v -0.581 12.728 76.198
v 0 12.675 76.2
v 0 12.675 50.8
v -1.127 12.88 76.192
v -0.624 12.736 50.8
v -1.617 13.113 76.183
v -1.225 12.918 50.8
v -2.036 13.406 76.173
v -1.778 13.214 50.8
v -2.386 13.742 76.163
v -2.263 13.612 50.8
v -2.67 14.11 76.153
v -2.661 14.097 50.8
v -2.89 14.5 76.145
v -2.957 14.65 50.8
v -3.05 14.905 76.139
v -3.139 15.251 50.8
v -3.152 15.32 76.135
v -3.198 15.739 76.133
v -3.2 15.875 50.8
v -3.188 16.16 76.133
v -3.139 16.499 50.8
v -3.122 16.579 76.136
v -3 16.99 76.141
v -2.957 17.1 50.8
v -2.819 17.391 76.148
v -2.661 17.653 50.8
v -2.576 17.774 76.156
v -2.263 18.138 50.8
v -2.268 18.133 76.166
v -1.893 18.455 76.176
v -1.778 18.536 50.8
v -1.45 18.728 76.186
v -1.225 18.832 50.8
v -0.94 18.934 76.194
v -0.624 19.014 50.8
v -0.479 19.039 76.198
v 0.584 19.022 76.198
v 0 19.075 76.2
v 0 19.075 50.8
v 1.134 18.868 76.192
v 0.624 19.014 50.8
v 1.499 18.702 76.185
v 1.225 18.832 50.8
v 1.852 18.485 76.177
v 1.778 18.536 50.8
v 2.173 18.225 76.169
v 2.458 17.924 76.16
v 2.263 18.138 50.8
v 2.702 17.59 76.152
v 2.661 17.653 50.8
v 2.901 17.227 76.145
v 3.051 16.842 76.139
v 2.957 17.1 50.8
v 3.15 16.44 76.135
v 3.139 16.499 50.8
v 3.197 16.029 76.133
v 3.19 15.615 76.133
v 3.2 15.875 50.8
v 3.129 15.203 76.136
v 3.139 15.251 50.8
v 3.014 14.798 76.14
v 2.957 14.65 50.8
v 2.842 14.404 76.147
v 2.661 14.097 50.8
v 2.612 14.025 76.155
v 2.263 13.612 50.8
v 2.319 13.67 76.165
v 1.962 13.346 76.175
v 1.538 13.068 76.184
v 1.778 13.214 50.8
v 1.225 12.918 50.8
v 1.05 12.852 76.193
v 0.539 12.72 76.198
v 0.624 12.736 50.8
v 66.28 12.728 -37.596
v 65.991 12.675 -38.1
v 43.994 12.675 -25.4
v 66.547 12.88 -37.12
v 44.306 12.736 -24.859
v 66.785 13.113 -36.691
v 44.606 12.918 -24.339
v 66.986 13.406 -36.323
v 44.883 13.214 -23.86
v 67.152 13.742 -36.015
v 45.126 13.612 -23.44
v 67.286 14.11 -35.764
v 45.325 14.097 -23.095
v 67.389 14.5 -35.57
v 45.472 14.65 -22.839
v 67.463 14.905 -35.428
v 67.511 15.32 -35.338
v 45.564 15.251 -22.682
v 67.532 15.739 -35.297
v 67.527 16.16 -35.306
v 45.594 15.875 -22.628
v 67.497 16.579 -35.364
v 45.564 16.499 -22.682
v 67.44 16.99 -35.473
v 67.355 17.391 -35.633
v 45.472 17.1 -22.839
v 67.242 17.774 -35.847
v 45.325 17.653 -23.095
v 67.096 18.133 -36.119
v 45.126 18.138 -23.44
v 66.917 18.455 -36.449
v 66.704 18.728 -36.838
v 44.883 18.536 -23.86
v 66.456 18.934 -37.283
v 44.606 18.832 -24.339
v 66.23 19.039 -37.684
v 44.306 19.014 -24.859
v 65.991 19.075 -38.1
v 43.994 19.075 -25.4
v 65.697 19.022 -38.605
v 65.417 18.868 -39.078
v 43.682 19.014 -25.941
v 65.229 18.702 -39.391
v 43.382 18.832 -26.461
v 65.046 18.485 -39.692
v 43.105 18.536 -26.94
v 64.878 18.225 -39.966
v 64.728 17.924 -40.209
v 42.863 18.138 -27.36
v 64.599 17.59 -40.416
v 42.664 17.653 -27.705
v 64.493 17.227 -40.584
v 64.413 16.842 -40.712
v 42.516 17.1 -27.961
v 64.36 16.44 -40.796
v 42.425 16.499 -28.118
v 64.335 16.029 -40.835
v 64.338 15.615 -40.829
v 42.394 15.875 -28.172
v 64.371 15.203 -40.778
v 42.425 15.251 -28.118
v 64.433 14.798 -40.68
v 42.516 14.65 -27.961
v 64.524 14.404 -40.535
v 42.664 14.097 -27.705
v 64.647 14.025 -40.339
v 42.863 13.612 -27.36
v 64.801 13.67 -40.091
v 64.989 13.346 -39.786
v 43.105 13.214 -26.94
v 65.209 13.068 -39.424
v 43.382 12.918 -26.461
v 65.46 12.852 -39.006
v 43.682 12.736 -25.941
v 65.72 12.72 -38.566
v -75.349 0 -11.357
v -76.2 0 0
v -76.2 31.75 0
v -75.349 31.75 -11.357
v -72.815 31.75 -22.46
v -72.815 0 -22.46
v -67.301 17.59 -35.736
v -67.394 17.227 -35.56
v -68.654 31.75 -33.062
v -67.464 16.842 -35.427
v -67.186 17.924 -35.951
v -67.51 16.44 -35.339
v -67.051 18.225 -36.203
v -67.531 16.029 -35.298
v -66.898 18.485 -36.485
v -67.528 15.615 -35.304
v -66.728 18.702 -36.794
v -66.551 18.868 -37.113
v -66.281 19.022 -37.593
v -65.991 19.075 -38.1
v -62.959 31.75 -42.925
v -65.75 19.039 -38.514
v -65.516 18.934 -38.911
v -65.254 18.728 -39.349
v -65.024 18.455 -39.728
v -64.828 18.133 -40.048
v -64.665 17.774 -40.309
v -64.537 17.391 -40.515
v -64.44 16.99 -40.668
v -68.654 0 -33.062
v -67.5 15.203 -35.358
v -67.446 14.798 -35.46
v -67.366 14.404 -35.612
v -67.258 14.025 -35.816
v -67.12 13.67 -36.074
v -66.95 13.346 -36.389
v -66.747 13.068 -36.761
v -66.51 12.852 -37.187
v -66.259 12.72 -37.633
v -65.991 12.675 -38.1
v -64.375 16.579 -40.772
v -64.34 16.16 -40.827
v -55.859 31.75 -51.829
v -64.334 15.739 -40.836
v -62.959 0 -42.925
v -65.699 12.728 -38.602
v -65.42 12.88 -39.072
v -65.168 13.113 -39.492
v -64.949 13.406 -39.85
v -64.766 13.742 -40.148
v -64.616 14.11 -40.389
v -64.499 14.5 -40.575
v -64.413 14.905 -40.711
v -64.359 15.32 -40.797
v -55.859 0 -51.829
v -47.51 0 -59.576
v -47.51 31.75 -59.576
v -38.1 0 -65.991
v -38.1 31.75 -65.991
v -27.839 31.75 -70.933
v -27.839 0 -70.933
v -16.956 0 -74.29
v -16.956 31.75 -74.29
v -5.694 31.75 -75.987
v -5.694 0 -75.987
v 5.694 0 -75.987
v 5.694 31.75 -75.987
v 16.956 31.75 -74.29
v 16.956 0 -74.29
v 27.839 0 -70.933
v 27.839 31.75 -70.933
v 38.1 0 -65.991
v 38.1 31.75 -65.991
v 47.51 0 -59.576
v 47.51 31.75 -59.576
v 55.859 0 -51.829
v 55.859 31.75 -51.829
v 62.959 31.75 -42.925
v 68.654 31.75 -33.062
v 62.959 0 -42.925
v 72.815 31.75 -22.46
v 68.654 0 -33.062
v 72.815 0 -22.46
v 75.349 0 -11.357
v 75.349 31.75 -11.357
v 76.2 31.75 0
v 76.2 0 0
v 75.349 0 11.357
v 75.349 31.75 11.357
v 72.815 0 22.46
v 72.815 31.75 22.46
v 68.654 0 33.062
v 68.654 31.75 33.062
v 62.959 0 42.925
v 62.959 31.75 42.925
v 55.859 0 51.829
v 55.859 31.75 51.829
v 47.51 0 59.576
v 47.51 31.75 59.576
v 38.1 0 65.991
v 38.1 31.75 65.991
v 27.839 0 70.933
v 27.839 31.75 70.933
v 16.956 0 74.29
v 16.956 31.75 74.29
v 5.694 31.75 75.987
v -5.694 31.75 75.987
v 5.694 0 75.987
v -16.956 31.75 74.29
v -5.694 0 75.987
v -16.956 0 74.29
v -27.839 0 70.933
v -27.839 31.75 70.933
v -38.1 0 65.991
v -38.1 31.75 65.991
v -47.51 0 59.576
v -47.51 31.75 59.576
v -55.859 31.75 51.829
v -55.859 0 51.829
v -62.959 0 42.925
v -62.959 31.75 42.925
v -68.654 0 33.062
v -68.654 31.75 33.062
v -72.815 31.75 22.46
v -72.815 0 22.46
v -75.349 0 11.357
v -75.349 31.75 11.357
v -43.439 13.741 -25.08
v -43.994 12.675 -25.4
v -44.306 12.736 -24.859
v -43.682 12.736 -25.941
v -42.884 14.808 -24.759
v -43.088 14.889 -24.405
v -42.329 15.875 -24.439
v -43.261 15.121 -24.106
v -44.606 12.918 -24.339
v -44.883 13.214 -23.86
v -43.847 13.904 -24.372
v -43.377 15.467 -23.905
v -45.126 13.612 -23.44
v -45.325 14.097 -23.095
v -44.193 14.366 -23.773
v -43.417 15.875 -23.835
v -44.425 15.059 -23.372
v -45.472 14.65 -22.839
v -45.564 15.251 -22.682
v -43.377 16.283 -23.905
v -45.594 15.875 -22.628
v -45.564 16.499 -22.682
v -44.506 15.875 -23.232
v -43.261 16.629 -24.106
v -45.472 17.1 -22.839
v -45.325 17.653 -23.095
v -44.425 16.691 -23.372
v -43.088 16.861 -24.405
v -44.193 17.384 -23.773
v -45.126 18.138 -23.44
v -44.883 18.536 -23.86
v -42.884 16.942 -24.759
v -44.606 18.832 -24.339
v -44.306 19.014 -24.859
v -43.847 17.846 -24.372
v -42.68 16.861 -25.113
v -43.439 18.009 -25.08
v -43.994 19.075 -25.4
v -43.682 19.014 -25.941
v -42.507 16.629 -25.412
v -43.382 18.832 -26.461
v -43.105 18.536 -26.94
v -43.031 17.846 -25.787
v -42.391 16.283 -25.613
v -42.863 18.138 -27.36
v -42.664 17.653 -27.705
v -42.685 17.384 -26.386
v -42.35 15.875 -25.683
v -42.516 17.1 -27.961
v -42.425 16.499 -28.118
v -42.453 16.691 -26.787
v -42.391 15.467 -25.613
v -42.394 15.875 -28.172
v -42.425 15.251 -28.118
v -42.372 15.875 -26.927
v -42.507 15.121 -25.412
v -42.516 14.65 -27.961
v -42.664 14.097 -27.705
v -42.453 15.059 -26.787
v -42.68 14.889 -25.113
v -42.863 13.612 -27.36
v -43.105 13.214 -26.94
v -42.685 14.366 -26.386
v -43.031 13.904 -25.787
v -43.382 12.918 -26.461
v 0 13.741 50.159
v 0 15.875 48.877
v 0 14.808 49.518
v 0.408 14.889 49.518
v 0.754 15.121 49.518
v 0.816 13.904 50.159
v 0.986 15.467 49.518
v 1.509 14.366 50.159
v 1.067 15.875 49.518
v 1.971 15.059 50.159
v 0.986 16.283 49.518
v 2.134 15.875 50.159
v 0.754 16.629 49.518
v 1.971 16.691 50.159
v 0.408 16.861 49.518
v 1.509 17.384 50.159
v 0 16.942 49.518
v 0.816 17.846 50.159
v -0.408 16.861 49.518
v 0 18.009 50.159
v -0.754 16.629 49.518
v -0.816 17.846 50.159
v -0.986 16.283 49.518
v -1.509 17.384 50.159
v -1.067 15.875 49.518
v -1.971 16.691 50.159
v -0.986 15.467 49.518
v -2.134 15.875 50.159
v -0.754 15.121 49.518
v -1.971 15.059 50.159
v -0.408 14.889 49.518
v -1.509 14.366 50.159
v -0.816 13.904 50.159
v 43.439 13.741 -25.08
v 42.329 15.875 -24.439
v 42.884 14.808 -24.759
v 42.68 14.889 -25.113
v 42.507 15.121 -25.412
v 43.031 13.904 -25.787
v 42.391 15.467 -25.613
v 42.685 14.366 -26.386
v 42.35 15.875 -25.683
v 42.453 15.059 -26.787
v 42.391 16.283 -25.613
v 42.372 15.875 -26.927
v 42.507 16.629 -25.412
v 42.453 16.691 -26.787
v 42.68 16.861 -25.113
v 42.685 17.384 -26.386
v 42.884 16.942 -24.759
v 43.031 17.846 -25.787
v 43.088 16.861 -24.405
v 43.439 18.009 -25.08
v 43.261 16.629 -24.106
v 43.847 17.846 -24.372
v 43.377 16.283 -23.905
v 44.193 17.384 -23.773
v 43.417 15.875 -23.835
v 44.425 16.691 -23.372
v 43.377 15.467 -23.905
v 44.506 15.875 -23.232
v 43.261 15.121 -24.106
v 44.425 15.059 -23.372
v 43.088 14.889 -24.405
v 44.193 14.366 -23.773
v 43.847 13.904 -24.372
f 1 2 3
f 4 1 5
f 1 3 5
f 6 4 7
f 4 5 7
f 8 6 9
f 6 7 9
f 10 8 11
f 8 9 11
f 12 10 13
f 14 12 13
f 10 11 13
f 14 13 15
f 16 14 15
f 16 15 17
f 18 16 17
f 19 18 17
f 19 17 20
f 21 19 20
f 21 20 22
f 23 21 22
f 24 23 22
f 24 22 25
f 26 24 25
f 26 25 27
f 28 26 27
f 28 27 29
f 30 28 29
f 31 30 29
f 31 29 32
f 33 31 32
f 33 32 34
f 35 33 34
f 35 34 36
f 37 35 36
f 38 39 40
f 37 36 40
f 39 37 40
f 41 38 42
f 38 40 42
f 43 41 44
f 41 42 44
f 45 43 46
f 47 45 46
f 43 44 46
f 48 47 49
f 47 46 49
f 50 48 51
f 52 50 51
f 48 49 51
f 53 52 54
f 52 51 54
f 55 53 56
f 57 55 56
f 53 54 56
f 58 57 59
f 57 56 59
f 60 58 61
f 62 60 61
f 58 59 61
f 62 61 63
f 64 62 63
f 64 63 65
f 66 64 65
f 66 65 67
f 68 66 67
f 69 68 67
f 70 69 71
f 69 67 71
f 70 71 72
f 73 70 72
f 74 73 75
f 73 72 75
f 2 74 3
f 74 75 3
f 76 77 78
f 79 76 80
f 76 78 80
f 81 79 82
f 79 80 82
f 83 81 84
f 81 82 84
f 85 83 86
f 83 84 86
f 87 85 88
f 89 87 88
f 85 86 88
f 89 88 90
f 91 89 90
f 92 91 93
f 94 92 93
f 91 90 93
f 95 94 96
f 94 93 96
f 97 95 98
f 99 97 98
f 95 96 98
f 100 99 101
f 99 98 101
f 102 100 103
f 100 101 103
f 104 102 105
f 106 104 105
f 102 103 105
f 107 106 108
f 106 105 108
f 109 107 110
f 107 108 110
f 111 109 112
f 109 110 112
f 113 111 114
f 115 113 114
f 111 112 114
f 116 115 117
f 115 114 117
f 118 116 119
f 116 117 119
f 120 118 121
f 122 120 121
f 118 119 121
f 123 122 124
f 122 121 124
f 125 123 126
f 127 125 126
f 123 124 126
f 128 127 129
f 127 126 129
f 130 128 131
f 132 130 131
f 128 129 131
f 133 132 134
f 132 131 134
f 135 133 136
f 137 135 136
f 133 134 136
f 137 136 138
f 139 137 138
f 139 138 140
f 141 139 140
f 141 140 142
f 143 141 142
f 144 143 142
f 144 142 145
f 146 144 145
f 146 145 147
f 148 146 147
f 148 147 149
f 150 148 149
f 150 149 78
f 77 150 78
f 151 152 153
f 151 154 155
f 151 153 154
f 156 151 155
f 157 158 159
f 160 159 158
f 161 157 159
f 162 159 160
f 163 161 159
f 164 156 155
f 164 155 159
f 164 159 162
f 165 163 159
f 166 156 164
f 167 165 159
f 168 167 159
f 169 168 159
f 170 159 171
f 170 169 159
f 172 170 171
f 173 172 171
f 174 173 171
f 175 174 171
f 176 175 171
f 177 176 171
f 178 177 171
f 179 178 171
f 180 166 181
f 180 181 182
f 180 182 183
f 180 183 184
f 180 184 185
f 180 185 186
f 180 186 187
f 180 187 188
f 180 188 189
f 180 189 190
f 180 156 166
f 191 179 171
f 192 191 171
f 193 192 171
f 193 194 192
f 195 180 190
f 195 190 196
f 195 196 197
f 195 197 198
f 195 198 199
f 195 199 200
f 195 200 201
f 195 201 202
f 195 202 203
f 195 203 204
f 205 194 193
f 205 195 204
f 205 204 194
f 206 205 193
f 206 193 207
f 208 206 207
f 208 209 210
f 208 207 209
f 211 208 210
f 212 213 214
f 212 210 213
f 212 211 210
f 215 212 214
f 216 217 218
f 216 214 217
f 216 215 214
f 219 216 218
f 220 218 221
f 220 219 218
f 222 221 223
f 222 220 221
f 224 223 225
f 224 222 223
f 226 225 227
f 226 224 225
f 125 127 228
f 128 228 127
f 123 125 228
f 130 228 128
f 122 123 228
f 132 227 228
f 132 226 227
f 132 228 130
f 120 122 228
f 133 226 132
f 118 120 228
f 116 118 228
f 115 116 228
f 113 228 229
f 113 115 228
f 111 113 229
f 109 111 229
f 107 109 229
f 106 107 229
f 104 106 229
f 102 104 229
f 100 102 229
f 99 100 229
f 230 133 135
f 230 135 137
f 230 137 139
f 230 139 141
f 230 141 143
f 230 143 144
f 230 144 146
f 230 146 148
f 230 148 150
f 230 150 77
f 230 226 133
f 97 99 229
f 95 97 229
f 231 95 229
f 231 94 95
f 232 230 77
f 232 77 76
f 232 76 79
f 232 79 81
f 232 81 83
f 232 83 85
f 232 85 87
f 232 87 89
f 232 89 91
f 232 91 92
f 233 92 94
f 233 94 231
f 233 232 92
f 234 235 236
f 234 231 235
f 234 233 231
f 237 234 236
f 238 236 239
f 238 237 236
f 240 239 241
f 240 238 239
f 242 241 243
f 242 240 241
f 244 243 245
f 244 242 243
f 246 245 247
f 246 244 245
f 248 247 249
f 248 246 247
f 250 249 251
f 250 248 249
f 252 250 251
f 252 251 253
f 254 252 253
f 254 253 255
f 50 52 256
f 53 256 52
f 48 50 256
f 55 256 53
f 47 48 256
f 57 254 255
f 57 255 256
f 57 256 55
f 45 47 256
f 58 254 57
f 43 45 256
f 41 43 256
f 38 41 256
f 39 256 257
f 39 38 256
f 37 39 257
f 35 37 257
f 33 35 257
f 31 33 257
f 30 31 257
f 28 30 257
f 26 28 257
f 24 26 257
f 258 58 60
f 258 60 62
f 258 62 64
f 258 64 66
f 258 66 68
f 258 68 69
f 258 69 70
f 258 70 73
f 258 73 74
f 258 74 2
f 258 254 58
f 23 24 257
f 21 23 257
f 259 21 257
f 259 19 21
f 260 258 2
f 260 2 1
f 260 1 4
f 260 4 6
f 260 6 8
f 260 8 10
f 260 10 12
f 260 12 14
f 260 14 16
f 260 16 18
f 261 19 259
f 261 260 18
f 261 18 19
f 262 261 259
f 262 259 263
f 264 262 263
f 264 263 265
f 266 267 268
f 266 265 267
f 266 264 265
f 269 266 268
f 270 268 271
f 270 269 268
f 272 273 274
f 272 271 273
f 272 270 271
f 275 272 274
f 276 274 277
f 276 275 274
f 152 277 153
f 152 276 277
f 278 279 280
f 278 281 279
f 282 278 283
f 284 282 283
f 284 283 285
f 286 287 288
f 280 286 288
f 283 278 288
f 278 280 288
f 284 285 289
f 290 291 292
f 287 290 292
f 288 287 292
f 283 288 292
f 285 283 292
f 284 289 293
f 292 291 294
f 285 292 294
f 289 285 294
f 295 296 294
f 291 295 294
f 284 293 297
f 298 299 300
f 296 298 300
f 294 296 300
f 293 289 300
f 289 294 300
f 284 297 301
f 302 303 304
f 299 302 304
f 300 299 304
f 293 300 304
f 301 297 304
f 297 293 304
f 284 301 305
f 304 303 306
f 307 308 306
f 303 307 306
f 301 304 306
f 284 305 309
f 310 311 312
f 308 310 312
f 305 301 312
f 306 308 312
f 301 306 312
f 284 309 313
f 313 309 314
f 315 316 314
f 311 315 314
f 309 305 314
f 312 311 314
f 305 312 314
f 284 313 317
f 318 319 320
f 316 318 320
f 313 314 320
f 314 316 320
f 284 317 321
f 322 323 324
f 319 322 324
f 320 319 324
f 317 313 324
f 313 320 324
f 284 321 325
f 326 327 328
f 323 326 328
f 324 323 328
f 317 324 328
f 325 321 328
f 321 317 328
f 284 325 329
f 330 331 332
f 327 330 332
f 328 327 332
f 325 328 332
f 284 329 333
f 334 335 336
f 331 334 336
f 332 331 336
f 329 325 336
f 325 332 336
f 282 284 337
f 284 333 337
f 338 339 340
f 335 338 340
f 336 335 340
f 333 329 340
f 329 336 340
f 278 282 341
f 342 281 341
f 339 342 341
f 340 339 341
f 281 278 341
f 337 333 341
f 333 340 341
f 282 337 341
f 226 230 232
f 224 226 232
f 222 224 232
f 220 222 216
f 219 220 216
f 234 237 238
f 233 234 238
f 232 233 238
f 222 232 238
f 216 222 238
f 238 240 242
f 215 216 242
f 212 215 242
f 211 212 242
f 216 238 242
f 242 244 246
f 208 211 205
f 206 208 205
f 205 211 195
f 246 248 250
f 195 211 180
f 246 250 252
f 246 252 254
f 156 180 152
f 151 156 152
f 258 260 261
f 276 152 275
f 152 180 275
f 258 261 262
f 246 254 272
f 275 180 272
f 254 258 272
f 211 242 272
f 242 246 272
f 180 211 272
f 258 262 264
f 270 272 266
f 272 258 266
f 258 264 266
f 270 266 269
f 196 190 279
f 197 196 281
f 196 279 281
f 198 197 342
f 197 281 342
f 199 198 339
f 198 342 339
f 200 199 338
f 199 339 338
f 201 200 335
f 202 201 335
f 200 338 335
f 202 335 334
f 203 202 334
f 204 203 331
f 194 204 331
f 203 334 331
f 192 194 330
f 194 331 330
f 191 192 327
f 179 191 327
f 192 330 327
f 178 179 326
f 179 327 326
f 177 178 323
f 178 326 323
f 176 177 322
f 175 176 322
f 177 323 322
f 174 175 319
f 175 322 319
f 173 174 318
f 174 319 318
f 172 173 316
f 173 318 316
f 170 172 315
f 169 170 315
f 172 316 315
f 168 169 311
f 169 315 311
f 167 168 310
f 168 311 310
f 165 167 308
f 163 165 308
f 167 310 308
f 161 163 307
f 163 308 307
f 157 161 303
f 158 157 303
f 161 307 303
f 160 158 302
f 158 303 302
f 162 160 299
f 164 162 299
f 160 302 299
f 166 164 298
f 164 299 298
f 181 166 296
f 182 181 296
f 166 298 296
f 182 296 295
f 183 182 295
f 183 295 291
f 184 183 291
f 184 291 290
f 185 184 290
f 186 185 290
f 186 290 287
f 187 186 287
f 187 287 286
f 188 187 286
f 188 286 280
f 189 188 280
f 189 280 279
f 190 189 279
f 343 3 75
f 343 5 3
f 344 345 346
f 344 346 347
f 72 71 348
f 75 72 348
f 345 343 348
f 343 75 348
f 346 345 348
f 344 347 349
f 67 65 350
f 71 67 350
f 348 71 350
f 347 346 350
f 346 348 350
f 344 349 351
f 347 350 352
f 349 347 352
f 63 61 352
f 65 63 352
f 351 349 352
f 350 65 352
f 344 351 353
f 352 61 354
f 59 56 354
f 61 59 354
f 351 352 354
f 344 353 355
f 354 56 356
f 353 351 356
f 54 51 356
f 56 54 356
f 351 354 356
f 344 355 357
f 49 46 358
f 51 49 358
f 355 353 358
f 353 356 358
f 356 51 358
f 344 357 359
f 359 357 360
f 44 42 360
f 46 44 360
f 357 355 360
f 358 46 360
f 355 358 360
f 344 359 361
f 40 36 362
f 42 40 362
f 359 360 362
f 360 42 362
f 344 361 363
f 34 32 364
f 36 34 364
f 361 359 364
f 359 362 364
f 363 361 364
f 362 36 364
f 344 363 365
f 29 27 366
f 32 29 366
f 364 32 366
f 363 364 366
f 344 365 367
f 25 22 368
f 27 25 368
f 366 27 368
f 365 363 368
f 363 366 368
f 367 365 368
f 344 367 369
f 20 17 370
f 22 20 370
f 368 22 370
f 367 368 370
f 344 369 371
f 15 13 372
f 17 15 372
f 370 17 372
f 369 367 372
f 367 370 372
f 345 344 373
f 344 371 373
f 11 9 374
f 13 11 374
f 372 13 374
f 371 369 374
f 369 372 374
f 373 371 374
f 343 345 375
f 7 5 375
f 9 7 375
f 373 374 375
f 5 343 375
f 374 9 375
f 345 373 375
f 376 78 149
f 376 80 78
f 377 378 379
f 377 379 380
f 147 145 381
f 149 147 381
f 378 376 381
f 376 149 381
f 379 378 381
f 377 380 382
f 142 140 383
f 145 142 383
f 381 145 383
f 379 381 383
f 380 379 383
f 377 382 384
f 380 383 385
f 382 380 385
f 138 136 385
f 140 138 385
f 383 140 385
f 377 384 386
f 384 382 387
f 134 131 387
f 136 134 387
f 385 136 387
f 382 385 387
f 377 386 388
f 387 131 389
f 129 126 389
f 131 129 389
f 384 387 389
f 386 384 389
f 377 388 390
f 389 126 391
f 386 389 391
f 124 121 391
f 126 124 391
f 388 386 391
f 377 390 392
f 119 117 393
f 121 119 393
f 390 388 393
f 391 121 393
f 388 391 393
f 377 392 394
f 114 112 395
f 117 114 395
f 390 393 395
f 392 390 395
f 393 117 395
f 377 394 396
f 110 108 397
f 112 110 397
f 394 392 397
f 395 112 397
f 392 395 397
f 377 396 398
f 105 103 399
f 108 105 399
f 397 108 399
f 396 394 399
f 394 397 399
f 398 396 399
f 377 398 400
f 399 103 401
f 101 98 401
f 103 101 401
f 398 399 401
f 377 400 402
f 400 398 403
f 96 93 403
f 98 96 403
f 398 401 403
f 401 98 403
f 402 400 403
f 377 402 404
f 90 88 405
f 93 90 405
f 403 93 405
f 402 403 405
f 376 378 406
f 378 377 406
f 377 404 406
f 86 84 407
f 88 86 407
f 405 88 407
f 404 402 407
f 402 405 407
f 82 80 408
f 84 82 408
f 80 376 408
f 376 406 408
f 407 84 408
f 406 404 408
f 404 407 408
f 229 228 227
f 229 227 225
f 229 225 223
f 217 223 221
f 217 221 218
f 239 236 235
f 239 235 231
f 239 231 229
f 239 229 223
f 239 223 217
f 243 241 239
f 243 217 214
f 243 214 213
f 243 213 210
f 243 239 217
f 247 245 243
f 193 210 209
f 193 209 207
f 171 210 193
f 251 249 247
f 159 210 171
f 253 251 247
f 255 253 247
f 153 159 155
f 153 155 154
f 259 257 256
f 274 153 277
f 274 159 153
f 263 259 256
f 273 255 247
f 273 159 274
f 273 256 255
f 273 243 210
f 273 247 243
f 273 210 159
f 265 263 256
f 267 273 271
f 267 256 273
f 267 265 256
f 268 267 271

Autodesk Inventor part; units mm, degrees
ref_plane "YZ Plane" through (0, 0, 0) normal (1, 0, 0) x (0, 1, 0)
ref_plane "XZ Plane" through (0, 0, 0) normal (0, 1, 0) x (-1, 0, 0)
sketch "Sketch1" plane through (0, 0, 0) normal (0, 1, 0) x (-1, 0, 0)
  circle A0 centre (0, 0) radius 76.2
  dimension "d0" = 152.4
extrude "Extrusion1" add sketch "Sketch1" along normal blind 31.75
ref_plane "Work Plane1" through (0, 0, 76.2) normal (0, 0, 1) x (1, 0, 0)
sketch "Sketch2" plane through (0, 0, 76.2) normal (0, 0, 1) x (1, 0, 0)
  point P0 (0, 0)
  point P1 (0, 15.875)
  dimension "d4" = 15.875
hole "Hole1" at (0, 15.875, 76.2) direction (0, 0, -1) diameter 6.4008 depth 25.4 tip angle 118 thread size "5/16-18 UNC" class "2B" standard "ANSI Unified Screw Threads"
pattern_circular "Circular Pattern1" count 3 over 360 about axis through (0, 31.75, 0) along (0, 1, 0) of "Hole1"
properties part number "Heat-Sink"
